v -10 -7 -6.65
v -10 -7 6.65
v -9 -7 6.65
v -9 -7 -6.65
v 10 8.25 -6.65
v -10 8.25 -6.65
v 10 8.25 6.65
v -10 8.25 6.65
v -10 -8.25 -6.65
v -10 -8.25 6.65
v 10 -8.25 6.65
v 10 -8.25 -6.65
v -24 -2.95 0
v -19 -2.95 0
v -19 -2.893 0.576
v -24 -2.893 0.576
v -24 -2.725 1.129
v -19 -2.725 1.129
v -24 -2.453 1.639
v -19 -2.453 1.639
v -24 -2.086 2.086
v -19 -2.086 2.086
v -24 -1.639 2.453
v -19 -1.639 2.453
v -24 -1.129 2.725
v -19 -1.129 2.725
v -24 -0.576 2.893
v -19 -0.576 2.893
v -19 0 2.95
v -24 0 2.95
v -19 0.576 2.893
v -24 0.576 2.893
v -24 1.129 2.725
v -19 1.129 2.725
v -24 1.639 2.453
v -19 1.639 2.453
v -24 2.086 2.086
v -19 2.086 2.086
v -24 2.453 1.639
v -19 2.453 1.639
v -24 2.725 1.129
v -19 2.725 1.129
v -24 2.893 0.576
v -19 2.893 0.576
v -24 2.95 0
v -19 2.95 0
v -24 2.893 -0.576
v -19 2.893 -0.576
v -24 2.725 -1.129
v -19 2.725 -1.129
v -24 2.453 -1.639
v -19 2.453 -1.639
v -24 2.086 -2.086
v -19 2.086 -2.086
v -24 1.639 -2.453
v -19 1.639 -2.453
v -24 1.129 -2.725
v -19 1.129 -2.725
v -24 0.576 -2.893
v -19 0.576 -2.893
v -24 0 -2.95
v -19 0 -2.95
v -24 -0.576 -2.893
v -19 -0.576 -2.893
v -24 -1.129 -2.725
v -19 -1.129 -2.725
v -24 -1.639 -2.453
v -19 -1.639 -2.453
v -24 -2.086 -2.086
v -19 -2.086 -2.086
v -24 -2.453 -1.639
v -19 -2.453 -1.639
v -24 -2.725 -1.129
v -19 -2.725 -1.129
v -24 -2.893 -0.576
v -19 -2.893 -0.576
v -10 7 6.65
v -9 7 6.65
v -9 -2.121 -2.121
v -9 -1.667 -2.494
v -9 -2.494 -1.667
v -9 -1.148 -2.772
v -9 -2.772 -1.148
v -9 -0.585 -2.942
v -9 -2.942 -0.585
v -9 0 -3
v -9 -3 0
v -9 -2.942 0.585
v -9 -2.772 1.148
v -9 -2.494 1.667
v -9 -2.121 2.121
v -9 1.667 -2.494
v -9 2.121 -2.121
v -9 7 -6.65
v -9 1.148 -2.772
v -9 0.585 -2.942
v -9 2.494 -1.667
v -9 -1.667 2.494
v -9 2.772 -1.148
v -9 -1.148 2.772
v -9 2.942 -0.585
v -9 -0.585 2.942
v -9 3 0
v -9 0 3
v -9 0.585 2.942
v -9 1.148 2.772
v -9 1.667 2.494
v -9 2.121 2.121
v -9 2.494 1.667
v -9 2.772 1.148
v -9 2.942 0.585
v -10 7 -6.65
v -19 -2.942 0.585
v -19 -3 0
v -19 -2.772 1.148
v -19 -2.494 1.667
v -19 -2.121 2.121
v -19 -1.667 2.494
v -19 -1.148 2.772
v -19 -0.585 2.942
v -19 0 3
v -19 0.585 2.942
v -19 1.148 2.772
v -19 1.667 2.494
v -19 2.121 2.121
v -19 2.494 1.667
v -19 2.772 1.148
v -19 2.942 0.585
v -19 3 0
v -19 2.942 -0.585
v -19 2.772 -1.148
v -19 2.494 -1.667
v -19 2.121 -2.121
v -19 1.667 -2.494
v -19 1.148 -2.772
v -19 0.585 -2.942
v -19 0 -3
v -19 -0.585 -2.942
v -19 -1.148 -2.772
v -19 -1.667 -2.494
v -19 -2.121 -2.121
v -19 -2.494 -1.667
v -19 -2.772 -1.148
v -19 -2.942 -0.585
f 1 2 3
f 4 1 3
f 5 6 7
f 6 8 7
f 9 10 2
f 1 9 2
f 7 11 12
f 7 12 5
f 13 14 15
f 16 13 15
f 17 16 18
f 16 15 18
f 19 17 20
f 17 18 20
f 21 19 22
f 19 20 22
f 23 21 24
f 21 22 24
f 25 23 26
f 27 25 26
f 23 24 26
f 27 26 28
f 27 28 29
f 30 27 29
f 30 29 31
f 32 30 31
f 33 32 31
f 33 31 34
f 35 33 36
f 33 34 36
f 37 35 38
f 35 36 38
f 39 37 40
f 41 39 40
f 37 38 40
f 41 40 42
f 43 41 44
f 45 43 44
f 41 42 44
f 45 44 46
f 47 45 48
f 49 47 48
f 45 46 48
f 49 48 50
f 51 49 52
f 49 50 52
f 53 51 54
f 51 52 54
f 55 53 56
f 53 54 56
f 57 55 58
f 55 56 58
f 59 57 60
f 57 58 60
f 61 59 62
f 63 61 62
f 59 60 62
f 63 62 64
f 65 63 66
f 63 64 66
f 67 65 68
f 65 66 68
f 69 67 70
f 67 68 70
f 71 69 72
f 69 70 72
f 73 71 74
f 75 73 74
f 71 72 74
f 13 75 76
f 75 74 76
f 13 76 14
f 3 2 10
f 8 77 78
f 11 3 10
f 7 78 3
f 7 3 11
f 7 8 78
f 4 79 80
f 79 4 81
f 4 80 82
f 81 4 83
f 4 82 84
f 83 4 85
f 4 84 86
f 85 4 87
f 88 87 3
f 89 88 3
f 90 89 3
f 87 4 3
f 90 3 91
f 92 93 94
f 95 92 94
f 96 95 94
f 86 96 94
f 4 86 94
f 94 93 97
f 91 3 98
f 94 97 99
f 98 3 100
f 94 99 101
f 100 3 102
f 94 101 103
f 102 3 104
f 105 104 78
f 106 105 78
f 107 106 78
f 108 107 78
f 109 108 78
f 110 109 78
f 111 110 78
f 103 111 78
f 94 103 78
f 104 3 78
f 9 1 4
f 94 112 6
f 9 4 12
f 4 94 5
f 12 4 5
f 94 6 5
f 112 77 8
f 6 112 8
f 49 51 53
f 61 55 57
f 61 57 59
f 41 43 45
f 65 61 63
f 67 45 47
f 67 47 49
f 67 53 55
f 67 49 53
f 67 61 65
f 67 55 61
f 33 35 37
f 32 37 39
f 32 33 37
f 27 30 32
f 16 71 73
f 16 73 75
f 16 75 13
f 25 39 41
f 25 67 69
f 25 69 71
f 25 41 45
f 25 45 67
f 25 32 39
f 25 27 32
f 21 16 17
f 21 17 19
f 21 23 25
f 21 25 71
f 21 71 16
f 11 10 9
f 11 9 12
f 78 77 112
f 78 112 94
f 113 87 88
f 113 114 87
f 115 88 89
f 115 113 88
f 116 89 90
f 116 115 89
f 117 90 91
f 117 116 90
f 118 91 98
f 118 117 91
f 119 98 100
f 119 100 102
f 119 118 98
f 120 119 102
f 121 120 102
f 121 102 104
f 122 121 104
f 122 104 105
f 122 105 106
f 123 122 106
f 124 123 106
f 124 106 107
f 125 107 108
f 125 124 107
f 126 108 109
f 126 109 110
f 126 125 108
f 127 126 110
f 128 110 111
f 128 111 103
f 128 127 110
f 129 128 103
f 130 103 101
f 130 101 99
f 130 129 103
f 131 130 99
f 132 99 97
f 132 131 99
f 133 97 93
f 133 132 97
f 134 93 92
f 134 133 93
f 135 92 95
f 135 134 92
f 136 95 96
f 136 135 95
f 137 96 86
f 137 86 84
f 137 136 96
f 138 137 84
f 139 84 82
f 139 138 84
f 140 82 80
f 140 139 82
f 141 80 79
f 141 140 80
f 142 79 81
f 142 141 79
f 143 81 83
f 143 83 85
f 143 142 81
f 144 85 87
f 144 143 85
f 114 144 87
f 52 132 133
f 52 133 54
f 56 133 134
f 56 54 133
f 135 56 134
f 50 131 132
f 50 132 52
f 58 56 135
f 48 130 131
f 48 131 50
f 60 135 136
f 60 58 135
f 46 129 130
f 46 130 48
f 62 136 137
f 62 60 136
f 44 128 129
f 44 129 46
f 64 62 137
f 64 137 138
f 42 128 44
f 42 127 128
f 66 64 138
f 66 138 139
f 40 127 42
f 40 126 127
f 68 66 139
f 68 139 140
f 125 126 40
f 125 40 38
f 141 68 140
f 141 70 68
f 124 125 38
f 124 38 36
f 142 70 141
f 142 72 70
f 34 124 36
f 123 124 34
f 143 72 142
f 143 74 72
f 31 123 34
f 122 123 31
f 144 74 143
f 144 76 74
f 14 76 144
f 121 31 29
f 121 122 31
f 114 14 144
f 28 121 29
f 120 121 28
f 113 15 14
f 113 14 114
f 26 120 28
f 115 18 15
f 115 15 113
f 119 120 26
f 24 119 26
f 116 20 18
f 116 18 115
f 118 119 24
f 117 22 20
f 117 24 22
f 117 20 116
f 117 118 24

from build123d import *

# Parameters (mm, degrees)
F0_W          = 20
F0_H          = 16.5
F1_DEPTH      = 6.65
F3_W          = 1
F3_H          = 14
F4_DEPTH      = 13.301
F2_R          = 3
F5_DEPTH      = 9
F5_DEPTH_BACK = 1
F6_R          = 2.95
F7_DEPTH      = 5


with BuildPart() as f1:
    # F0 (on Top) → F1 (new body, symmetric)
    with BuildSketch(Plane.XY):
        Rectangle(F0_W, F0_H)
    extrude(amount=F1_DEPTH, both=True)

    # F3 (on face) → F4 (cut, through all)
    with BuildSketch(Plane.XY.offset(6.65)):
        with Locations((-9.5, 0)):
            Rectangle(F3_W, F3_H)
    extrude(amount=-F4_DEPTH, mode=Mode.SUBTRACT)

    # F2 (on face) → F5 (join, two sides)
    with BuildSketch(Plane(origin=(-10, 0, 0), x_dir=(0, -1, 0), z_dir=(-1, 0, 0))) as f5_sk:
        Circle(F2_R)
    extrude(amount=F5_DEPTH)
    extrude(f5_sk.sketch, amount=-F5_DEPTH_BACK)

    # F6 (on face) → F7 (join)
    with BuildSketch(Plane(origin=(-19, 0, 0), x_dir=(0, -1, 0), z_dir=(-1, 0, 0))):
        Circle(F6_R)
    extrude(amount=F7_DEPTH)


solid = f1.part
